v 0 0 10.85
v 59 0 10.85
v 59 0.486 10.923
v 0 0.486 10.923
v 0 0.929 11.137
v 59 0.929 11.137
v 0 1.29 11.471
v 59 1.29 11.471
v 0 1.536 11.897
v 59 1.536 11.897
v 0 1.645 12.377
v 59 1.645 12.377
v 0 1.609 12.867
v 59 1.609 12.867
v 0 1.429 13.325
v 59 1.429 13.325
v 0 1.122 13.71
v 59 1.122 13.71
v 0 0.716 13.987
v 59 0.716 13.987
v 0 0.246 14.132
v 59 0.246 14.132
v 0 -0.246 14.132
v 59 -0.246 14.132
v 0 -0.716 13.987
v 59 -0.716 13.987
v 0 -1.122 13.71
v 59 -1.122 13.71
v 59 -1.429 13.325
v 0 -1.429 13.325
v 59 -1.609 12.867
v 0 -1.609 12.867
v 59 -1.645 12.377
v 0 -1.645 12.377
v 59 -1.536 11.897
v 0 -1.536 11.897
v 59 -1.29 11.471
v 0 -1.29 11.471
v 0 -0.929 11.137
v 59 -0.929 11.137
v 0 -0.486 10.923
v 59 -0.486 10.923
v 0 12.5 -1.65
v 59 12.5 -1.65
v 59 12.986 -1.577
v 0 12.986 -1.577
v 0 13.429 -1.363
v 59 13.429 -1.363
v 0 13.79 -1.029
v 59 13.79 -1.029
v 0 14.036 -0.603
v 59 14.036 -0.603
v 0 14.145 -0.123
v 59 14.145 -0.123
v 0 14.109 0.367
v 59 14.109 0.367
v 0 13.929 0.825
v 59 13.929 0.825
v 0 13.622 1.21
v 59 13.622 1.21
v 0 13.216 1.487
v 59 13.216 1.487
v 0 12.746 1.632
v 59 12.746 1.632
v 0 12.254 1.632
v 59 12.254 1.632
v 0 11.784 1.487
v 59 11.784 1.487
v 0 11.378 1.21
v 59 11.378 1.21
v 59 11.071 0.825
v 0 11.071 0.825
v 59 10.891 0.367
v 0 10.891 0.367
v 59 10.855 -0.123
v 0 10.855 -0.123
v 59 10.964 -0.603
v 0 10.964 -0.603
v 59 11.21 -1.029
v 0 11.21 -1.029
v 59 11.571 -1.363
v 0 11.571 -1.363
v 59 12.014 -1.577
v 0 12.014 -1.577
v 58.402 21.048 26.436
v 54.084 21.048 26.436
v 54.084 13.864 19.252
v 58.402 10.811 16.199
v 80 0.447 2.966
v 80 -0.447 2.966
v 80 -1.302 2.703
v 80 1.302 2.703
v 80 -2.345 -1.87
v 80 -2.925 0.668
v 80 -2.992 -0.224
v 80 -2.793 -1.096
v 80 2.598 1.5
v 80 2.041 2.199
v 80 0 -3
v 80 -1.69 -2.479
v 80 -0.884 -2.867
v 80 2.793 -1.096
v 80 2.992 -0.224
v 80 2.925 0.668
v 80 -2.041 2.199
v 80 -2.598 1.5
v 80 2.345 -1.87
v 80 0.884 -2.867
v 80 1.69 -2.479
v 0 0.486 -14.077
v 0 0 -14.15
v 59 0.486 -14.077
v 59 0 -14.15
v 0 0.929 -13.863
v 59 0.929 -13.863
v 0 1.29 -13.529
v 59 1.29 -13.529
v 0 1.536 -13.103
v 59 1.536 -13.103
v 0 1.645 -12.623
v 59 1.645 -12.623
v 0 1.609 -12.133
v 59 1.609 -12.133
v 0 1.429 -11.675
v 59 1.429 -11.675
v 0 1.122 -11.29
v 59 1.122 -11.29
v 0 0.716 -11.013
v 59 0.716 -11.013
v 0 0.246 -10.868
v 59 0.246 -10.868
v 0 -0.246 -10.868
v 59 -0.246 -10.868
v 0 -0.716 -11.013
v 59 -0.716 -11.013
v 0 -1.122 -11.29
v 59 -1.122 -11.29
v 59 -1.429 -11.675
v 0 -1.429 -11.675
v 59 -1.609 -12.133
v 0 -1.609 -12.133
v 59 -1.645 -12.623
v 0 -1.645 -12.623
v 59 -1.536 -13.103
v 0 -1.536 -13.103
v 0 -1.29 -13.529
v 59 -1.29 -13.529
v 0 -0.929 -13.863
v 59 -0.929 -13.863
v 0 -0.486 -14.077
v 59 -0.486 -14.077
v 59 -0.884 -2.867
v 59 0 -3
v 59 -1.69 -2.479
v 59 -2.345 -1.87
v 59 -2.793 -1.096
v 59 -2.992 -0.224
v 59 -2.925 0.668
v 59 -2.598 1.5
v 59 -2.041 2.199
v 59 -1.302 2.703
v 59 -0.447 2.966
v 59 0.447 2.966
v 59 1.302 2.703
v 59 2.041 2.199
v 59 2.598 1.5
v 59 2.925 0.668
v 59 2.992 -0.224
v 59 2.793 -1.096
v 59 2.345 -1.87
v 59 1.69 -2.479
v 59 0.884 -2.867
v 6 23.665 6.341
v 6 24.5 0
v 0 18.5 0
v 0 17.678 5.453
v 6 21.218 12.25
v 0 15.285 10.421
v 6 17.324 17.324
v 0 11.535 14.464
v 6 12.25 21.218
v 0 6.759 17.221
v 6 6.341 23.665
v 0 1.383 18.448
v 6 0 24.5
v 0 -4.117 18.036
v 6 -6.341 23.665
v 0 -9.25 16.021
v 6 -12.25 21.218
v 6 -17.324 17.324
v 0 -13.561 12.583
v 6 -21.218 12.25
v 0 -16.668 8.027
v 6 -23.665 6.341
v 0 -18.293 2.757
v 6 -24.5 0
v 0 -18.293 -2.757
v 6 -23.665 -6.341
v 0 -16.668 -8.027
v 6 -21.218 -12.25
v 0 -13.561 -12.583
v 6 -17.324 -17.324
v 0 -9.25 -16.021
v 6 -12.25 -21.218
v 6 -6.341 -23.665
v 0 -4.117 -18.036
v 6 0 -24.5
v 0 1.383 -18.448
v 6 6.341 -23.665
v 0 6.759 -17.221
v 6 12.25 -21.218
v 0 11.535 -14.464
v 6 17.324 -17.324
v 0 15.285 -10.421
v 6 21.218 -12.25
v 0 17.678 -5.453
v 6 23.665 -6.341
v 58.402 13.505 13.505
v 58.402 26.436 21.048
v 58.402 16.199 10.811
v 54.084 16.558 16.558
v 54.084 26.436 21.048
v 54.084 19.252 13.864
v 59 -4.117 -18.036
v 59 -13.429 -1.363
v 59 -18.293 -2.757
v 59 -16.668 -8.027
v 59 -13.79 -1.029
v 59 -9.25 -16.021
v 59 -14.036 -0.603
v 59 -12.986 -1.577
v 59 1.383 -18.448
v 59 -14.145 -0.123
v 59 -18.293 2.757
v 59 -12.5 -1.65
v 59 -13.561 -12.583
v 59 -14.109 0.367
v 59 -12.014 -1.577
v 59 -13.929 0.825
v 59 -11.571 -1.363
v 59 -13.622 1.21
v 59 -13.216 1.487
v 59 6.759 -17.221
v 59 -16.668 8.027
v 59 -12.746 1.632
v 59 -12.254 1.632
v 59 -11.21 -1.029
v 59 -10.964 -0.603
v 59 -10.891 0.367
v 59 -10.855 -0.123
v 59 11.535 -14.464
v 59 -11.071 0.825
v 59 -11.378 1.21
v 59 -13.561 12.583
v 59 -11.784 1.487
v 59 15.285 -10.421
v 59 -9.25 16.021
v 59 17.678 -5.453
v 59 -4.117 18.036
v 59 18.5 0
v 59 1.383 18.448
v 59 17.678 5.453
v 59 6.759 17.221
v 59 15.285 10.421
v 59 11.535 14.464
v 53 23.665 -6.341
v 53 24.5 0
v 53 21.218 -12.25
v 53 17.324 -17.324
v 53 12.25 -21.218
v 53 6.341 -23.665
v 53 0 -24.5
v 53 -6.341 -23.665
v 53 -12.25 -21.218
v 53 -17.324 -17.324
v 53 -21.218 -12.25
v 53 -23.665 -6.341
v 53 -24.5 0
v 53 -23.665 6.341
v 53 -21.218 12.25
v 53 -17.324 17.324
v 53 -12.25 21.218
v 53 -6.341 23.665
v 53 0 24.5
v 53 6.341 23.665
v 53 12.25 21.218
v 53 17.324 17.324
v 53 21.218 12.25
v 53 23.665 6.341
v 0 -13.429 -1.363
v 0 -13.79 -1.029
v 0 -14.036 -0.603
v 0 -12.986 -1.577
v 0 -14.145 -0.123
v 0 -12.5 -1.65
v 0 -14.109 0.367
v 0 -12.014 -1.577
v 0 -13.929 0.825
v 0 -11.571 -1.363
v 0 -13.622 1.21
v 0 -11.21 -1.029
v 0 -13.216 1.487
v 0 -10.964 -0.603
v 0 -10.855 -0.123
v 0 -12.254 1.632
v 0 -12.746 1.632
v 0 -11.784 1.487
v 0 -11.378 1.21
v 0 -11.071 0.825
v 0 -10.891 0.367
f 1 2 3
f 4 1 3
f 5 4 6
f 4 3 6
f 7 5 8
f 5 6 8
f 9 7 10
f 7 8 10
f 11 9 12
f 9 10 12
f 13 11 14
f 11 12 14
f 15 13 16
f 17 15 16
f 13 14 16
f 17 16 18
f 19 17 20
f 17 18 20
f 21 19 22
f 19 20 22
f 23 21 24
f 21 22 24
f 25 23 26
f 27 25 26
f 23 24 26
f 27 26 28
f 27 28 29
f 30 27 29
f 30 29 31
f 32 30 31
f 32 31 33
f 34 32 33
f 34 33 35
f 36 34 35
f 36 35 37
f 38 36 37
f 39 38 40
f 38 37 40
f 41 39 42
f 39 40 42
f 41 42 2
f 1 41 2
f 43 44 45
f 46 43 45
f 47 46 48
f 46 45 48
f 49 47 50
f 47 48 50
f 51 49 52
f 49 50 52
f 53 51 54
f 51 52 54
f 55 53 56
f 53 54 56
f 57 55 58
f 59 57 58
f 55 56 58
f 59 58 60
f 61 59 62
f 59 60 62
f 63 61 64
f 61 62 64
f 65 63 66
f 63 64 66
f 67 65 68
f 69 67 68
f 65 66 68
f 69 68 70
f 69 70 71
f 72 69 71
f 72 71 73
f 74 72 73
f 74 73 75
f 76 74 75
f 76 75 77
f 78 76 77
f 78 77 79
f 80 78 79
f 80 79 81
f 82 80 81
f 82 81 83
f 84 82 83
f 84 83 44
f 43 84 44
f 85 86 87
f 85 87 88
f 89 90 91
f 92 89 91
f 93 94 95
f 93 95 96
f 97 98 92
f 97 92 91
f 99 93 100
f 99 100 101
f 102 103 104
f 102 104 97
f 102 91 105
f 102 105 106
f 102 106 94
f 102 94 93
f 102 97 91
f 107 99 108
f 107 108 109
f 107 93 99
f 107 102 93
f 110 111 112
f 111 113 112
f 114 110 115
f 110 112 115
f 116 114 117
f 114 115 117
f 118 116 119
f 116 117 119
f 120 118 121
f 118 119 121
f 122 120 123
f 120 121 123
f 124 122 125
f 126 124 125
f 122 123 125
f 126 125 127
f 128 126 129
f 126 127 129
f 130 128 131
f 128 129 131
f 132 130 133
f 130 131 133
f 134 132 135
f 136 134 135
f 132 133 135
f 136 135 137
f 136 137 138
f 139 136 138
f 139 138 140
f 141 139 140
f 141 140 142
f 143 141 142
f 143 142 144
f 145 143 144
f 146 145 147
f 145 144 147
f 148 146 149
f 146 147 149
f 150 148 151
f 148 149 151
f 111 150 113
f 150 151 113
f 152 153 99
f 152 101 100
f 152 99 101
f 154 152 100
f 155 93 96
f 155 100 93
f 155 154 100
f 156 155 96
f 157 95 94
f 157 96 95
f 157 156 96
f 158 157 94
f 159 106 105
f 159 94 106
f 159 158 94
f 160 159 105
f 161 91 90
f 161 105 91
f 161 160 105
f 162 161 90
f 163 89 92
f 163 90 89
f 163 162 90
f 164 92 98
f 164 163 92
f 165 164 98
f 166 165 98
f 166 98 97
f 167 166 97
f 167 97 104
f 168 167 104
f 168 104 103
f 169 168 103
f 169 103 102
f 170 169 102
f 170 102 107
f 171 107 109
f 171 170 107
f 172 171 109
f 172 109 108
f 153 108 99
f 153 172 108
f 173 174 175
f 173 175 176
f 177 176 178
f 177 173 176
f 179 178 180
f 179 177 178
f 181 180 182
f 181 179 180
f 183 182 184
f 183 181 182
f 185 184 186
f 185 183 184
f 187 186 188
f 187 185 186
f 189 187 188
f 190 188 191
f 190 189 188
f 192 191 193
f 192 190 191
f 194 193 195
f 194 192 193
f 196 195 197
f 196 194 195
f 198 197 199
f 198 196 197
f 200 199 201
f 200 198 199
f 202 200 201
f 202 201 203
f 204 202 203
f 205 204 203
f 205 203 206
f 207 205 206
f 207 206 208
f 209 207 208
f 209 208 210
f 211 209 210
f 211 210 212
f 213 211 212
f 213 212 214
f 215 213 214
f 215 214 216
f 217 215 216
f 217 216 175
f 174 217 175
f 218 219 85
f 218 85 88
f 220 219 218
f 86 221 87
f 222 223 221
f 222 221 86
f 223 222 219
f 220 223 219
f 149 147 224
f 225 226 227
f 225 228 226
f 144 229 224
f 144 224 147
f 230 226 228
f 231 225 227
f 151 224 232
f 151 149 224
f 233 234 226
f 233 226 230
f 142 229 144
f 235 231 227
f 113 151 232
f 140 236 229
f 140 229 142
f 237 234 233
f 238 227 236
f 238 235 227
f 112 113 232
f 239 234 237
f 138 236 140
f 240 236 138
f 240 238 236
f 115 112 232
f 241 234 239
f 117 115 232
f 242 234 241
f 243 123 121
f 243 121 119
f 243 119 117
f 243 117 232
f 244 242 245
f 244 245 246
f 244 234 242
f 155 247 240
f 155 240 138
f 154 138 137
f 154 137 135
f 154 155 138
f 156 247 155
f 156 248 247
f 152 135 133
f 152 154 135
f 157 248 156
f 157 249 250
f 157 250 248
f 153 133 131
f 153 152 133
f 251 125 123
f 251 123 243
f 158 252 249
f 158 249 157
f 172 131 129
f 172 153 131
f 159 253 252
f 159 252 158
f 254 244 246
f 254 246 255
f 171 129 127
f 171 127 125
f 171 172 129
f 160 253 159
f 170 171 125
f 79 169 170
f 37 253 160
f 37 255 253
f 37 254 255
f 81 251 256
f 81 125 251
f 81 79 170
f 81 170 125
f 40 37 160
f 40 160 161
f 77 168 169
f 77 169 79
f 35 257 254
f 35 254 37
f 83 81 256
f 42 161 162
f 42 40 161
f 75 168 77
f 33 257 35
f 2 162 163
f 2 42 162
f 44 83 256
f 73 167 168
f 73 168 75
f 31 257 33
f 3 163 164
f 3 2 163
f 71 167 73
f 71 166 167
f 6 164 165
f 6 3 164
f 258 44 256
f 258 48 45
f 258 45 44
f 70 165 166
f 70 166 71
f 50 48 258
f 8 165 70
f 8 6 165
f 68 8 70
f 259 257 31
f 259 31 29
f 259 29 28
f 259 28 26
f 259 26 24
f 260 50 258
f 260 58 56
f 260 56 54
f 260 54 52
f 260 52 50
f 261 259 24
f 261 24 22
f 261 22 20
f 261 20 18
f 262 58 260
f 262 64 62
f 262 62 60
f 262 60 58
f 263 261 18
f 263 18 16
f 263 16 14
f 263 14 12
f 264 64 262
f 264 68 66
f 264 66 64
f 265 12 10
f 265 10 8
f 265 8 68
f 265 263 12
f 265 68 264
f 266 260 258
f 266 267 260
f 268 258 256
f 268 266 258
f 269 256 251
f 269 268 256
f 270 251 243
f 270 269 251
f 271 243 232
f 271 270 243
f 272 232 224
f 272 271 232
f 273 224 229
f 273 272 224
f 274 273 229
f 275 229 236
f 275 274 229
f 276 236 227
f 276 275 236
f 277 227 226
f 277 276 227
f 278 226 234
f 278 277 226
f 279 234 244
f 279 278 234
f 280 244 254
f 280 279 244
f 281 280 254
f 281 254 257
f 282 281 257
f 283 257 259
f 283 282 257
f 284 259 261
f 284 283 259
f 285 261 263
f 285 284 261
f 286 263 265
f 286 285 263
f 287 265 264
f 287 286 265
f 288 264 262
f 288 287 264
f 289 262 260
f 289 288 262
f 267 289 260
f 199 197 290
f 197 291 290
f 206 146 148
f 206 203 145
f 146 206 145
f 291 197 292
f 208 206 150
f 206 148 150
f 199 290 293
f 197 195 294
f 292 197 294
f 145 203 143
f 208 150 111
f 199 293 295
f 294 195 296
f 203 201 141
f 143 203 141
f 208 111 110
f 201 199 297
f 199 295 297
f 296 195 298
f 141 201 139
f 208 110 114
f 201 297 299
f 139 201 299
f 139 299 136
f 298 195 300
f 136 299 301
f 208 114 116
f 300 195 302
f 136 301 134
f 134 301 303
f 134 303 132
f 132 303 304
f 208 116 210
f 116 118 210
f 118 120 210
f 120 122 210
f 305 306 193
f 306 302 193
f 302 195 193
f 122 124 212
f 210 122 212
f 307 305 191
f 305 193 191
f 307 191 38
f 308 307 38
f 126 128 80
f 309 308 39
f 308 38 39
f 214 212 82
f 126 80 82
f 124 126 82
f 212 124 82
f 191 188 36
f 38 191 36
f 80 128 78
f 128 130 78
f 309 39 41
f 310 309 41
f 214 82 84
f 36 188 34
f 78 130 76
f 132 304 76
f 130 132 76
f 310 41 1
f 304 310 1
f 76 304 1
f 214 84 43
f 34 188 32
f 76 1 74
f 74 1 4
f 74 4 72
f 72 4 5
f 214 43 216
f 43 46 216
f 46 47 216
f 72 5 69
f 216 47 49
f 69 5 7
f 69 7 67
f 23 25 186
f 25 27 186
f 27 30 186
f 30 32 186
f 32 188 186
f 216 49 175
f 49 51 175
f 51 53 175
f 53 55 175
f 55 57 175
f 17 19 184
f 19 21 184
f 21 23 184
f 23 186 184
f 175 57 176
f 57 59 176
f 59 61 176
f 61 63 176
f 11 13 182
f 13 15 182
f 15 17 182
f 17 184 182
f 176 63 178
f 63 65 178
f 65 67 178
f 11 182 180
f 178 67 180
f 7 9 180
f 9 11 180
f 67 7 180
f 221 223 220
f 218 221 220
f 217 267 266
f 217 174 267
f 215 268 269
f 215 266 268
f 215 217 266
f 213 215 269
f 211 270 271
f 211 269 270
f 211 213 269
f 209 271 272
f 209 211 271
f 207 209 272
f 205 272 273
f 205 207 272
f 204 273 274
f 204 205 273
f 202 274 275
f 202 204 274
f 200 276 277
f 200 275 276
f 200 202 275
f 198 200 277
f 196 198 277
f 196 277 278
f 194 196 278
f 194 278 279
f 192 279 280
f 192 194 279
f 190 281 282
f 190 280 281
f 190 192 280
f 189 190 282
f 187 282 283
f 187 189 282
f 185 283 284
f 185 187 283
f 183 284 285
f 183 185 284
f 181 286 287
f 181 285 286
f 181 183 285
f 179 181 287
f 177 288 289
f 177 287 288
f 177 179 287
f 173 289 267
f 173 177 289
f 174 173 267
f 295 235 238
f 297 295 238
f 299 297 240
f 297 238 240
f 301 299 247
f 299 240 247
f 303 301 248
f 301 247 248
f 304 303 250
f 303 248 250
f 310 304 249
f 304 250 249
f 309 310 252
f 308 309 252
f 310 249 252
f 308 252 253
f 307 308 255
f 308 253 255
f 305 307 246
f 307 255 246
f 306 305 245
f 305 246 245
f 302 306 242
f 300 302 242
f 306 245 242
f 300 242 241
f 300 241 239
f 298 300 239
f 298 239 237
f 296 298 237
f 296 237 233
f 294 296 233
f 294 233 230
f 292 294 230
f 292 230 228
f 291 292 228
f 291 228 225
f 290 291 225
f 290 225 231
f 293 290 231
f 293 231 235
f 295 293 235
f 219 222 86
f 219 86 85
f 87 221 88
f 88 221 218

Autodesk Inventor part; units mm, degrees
ref_plane "YZ Plane" through (0, 0, 0) normal (1, 0, 0) x (0, 1, 0)
ref_plane "XZ Plane" through (0, 0, 0) normal (0, 1, 0) x (-1, 0, 0)
sketch "Sketch1" plane through (0, 0, 0) normal (1, 0, 0) x (0, 1, 0)
  circle A0 centre (0, 0) radius 24.5
  dimension "d0" = 49
extrude "Extrusion1" add sketch "Sketch1" along normal blind 59
sketch "Sketch2" plane through (59, 0, 0) normal (1, 0, 0) x (0, 0, -1)
  circle A0 centre (0, 0) radius 3
  dimension "d3" = 6
extrude "Extrusion2" add sketch "Sketch2" along normal blind 21
sketch "Sketch3" plane through (59, 0, 0) normal (1, 0, 0) x (0, 0, -1)
  circle A0 centre (0, 0) radius 12.5 construction
  circle A1 centre (0, 12.5) radius 1.65
  circle A2 centre (12.5, 0) radius 1.65
  circle A3 centre (0, -12.5) radius 1.65
  circle A4 centre (-12.5, 0) radius 1.65
  line L0 (0, -34.3) -> (0, 34.3) projected
  line L1 (-34.3, 0) -> (34.3, 0) projected
  dimension "d6" = 25
  dimension "d7" = 3.3
extrude "Extrusion3" cut sketch "Sketch3" against normal through all
chamfer "Chamfer1" distance 6 angle 45 2 edges at (59, -24.5, 0) (0, -24.5, 0)
ref_plane "Work Plane2" through (0, 0, 0) normal (0, -0.7071, 0.7071) x (1, 0, 0)
sketch "Sketch5" plane through (0, 0, 0) normal (0, -0.7071, 0.7071) x (1, 0, 0)
  line L0 (53, -24.5) -> (53, 24.5) projected
  line L1 (59, 18.5) -> (59, -18.5) projected
  line L2 (53, 24.5) -> (59, 18.5) projected
  line L3 (53, -24.5) -> (59, -18.5) projected
  line L4 (54.0835, 23.4165) -> (54.0835, 33.5765)
  line L5 (54.0835, 33.5765) -> (58.4015, 33.5765)
  line L6 (58.4015, 33.5765) -> (58.4015, 19.0985)
  point P0 (0, 0)
  dimension "d19" = 10.16
  dimension "d21" = 4.318
  dimension "d22" = 1.0835
extrude "Extrusion5" add sketch "Sketch5" along normal mid plane 7.62 contours L4 L5 L6 L2
properties part number "TurnigySK3_Mock" material "Aluminum 6061"
